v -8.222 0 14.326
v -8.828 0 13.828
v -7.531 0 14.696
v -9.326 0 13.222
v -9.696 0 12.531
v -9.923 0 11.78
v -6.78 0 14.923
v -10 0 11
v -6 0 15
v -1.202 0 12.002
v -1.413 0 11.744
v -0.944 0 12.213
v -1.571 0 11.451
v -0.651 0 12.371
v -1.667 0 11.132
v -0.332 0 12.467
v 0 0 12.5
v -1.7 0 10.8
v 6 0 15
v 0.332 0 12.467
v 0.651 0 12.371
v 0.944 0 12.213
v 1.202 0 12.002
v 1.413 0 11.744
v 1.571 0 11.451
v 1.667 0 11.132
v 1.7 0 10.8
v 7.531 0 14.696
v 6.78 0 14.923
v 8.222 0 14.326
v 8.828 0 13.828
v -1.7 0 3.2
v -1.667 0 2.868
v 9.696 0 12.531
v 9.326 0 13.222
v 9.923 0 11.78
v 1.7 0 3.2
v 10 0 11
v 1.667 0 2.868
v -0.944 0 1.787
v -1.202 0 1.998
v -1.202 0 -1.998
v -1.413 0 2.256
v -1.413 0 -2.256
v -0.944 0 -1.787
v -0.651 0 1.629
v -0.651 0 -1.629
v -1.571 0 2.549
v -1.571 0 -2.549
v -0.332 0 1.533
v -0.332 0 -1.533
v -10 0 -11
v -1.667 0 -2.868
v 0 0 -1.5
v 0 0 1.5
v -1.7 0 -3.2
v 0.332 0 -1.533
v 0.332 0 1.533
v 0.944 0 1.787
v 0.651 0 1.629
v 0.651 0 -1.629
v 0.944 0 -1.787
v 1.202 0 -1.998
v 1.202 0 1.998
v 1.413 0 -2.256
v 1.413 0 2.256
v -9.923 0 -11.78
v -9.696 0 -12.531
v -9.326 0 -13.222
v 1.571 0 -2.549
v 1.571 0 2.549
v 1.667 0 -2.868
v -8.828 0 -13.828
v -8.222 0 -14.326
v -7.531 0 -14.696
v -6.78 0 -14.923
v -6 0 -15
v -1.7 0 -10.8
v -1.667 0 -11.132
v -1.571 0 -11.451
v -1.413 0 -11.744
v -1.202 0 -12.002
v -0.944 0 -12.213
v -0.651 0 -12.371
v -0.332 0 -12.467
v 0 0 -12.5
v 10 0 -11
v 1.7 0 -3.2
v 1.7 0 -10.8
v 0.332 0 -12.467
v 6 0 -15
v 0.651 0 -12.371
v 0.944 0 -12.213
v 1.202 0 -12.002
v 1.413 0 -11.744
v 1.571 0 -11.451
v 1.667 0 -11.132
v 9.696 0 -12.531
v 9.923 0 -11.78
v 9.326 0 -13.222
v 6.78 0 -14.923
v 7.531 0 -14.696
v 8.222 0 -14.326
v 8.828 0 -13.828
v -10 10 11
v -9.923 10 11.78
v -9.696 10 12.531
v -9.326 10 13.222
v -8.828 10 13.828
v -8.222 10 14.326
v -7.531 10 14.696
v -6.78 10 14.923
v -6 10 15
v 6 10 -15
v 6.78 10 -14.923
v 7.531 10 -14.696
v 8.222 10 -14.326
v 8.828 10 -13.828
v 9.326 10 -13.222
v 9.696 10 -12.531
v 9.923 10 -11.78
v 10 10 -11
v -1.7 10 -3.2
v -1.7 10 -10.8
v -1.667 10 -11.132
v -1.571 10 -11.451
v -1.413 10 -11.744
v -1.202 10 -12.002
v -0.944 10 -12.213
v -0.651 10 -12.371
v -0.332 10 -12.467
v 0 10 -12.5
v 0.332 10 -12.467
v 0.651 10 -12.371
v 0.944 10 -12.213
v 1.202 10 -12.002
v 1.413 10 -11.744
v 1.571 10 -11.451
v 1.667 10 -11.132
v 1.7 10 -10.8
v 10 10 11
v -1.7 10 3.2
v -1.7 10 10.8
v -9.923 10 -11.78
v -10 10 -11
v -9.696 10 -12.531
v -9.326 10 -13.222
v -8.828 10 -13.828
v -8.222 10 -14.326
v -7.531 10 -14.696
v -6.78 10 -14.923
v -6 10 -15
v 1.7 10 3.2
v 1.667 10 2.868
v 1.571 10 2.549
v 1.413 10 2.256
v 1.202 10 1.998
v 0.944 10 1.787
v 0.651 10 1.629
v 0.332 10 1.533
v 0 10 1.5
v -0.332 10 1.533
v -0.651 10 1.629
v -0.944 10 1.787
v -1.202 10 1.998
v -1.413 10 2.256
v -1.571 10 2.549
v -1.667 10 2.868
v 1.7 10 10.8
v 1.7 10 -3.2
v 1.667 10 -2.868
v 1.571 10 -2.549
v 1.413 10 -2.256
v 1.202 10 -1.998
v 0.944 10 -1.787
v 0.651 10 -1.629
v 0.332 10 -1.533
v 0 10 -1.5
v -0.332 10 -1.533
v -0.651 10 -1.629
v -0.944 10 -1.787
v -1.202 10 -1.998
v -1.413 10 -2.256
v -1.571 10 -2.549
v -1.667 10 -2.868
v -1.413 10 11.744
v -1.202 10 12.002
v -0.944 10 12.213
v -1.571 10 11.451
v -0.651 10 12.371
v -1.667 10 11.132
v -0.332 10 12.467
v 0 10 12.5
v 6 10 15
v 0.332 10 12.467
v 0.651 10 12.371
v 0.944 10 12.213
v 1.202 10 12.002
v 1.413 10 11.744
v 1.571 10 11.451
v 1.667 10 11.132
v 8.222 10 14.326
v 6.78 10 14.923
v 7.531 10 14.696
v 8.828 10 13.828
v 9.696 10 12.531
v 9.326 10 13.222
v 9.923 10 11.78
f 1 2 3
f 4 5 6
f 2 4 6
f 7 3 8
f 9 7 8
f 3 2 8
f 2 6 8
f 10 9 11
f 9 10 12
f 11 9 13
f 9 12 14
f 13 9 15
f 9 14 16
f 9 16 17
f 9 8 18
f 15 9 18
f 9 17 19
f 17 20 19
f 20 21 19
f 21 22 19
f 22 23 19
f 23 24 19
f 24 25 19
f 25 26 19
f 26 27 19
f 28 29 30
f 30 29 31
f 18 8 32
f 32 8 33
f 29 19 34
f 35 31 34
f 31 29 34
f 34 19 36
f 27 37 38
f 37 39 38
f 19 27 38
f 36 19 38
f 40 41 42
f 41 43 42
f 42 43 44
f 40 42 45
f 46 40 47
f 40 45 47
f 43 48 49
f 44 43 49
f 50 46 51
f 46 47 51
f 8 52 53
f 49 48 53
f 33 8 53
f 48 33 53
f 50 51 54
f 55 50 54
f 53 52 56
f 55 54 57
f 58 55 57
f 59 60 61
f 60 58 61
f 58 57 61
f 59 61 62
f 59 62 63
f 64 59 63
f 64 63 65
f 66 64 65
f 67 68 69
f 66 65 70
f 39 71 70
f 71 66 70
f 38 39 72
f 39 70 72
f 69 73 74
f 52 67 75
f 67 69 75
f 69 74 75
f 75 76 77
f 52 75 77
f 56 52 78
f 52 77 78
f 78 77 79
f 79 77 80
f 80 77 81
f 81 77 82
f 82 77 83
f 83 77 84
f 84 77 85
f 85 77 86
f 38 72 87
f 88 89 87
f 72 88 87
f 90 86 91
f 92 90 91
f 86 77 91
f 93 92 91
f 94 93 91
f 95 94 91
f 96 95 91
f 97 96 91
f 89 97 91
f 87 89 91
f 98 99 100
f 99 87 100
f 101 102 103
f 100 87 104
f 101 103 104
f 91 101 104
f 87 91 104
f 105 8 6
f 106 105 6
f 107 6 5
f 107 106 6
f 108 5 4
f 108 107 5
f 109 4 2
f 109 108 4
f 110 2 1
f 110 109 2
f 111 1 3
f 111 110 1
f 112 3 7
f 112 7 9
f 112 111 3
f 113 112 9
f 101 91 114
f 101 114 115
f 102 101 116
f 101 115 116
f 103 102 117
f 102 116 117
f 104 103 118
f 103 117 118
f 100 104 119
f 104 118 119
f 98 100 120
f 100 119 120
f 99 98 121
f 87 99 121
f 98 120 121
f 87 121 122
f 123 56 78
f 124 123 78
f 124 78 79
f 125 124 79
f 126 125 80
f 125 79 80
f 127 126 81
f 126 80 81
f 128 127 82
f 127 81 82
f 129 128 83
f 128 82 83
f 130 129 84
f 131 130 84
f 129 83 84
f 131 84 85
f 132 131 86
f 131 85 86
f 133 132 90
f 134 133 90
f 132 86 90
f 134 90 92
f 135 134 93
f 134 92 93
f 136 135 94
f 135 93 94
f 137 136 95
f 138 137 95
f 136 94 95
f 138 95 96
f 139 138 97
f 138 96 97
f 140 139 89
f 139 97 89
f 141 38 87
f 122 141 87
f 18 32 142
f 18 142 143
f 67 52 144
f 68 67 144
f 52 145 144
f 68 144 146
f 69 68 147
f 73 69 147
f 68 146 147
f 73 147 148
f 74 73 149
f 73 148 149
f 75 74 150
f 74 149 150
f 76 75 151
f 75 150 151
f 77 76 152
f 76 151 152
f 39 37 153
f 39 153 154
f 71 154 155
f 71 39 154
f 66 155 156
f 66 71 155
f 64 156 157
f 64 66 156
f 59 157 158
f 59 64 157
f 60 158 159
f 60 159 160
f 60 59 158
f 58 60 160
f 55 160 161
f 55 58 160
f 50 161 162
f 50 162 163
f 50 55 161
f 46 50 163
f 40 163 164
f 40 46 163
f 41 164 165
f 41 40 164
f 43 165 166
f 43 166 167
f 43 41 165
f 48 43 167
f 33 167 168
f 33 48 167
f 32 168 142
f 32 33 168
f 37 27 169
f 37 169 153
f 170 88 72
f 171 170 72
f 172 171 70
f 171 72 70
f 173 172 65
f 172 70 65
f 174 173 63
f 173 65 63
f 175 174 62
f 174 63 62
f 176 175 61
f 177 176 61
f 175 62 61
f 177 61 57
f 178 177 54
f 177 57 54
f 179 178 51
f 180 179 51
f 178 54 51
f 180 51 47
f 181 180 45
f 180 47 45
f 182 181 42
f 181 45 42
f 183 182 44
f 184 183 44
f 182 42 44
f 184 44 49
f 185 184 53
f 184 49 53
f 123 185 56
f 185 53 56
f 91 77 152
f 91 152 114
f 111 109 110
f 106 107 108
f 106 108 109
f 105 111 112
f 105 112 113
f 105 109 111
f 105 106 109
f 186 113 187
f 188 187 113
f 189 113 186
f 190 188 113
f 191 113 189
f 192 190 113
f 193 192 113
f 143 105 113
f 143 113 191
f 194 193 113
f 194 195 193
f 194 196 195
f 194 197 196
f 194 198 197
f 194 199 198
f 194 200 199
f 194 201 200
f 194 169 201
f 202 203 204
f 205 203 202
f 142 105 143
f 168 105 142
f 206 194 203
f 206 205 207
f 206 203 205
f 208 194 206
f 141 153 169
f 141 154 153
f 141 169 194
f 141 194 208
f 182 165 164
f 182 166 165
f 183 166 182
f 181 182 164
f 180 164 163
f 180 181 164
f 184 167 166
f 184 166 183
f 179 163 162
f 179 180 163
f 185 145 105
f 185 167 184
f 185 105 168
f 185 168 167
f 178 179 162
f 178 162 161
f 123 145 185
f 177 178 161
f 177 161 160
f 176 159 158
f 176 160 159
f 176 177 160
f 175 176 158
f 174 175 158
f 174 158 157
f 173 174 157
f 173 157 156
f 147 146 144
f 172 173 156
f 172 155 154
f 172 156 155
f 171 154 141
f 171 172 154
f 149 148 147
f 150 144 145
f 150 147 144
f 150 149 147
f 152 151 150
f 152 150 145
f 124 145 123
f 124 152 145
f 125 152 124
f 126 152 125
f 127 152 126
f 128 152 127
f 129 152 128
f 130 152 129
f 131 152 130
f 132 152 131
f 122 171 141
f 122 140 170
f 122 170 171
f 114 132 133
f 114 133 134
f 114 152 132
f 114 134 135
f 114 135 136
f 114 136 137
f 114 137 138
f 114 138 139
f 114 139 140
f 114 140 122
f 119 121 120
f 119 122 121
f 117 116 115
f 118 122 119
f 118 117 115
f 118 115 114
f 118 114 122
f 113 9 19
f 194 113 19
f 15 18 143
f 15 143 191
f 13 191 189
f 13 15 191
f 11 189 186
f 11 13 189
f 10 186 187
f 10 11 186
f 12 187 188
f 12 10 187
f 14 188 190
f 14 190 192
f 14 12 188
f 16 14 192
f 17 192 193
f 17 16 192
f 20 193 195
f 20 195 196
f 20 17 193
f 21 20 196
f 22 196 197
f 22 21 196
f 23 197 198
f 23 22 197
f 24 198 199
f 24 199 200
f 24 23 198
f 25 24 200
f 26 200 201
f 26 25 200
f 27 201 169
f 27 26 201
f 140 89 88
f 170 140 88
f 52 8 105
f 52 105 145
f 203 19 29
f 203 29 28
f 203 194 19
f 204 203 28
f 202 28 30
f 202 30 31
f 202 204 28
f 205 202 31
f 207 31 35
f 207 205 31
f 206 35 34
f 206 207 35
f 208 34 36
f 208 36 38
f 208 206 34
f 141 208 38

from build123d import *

# Parameters (mm, degrees)
SKETCH1_W           = 20
SKETCH1_H           = 30
BOSS_EXTRUDE1_DEPTH = 10
FILLET1_R           = 4


with BuildPart() as part:
    # Sketch1 → Boss-Extrude1 (new body)
    with BuildSketch(Plane(origin=(0, 0, 0), x_dir=(1, 0, 0), z_dir=(0, 1, 0))):
        Rectangle(SKETCH1_W, SKETCH1_H)
        with BuildLine():
            Line((1.7, 10.8), (1.7, 3.2))
            ThreePointArc((1.7, 3.2), (0, 1.5), (-1.7, 3.2))
            Line((-1.7, 3.2), (-1.7, 10.8))
            ThreePointArc((-1.7, 10.8), (0, 12.5), (1.7, 10.8))
        make_face(mode=Mode.SUBTRACT)
        with BuildLine():
            Line((1.7, -10.8), (1.7, -3.2))
            ThreePointArc((1.7, -3.2), (0, -1.5), (-1.7, -3.2))
            Line((-1.7, -3.2), (-1.7, -10.8))
            ThreePointArc((-1.7, -10.8), (0, -12.5), (1.7, -10.8))
        make_face(mode=Mode.SUBTRACT)
    extrude(amount=BOSS_EXTRUDE1_DEPTH)

    # Fillet1
    fillet1_edges = [part.edges().sort_by_distance(p)[0] for p in [
        (10, 5, 15),
        (-10, 5, 15),
        (-10, 5, -15),
        (10, 5, -15),
    ]]
    fillet(fillet1_edges, radius=FILLET1_R)


solid = part.part
